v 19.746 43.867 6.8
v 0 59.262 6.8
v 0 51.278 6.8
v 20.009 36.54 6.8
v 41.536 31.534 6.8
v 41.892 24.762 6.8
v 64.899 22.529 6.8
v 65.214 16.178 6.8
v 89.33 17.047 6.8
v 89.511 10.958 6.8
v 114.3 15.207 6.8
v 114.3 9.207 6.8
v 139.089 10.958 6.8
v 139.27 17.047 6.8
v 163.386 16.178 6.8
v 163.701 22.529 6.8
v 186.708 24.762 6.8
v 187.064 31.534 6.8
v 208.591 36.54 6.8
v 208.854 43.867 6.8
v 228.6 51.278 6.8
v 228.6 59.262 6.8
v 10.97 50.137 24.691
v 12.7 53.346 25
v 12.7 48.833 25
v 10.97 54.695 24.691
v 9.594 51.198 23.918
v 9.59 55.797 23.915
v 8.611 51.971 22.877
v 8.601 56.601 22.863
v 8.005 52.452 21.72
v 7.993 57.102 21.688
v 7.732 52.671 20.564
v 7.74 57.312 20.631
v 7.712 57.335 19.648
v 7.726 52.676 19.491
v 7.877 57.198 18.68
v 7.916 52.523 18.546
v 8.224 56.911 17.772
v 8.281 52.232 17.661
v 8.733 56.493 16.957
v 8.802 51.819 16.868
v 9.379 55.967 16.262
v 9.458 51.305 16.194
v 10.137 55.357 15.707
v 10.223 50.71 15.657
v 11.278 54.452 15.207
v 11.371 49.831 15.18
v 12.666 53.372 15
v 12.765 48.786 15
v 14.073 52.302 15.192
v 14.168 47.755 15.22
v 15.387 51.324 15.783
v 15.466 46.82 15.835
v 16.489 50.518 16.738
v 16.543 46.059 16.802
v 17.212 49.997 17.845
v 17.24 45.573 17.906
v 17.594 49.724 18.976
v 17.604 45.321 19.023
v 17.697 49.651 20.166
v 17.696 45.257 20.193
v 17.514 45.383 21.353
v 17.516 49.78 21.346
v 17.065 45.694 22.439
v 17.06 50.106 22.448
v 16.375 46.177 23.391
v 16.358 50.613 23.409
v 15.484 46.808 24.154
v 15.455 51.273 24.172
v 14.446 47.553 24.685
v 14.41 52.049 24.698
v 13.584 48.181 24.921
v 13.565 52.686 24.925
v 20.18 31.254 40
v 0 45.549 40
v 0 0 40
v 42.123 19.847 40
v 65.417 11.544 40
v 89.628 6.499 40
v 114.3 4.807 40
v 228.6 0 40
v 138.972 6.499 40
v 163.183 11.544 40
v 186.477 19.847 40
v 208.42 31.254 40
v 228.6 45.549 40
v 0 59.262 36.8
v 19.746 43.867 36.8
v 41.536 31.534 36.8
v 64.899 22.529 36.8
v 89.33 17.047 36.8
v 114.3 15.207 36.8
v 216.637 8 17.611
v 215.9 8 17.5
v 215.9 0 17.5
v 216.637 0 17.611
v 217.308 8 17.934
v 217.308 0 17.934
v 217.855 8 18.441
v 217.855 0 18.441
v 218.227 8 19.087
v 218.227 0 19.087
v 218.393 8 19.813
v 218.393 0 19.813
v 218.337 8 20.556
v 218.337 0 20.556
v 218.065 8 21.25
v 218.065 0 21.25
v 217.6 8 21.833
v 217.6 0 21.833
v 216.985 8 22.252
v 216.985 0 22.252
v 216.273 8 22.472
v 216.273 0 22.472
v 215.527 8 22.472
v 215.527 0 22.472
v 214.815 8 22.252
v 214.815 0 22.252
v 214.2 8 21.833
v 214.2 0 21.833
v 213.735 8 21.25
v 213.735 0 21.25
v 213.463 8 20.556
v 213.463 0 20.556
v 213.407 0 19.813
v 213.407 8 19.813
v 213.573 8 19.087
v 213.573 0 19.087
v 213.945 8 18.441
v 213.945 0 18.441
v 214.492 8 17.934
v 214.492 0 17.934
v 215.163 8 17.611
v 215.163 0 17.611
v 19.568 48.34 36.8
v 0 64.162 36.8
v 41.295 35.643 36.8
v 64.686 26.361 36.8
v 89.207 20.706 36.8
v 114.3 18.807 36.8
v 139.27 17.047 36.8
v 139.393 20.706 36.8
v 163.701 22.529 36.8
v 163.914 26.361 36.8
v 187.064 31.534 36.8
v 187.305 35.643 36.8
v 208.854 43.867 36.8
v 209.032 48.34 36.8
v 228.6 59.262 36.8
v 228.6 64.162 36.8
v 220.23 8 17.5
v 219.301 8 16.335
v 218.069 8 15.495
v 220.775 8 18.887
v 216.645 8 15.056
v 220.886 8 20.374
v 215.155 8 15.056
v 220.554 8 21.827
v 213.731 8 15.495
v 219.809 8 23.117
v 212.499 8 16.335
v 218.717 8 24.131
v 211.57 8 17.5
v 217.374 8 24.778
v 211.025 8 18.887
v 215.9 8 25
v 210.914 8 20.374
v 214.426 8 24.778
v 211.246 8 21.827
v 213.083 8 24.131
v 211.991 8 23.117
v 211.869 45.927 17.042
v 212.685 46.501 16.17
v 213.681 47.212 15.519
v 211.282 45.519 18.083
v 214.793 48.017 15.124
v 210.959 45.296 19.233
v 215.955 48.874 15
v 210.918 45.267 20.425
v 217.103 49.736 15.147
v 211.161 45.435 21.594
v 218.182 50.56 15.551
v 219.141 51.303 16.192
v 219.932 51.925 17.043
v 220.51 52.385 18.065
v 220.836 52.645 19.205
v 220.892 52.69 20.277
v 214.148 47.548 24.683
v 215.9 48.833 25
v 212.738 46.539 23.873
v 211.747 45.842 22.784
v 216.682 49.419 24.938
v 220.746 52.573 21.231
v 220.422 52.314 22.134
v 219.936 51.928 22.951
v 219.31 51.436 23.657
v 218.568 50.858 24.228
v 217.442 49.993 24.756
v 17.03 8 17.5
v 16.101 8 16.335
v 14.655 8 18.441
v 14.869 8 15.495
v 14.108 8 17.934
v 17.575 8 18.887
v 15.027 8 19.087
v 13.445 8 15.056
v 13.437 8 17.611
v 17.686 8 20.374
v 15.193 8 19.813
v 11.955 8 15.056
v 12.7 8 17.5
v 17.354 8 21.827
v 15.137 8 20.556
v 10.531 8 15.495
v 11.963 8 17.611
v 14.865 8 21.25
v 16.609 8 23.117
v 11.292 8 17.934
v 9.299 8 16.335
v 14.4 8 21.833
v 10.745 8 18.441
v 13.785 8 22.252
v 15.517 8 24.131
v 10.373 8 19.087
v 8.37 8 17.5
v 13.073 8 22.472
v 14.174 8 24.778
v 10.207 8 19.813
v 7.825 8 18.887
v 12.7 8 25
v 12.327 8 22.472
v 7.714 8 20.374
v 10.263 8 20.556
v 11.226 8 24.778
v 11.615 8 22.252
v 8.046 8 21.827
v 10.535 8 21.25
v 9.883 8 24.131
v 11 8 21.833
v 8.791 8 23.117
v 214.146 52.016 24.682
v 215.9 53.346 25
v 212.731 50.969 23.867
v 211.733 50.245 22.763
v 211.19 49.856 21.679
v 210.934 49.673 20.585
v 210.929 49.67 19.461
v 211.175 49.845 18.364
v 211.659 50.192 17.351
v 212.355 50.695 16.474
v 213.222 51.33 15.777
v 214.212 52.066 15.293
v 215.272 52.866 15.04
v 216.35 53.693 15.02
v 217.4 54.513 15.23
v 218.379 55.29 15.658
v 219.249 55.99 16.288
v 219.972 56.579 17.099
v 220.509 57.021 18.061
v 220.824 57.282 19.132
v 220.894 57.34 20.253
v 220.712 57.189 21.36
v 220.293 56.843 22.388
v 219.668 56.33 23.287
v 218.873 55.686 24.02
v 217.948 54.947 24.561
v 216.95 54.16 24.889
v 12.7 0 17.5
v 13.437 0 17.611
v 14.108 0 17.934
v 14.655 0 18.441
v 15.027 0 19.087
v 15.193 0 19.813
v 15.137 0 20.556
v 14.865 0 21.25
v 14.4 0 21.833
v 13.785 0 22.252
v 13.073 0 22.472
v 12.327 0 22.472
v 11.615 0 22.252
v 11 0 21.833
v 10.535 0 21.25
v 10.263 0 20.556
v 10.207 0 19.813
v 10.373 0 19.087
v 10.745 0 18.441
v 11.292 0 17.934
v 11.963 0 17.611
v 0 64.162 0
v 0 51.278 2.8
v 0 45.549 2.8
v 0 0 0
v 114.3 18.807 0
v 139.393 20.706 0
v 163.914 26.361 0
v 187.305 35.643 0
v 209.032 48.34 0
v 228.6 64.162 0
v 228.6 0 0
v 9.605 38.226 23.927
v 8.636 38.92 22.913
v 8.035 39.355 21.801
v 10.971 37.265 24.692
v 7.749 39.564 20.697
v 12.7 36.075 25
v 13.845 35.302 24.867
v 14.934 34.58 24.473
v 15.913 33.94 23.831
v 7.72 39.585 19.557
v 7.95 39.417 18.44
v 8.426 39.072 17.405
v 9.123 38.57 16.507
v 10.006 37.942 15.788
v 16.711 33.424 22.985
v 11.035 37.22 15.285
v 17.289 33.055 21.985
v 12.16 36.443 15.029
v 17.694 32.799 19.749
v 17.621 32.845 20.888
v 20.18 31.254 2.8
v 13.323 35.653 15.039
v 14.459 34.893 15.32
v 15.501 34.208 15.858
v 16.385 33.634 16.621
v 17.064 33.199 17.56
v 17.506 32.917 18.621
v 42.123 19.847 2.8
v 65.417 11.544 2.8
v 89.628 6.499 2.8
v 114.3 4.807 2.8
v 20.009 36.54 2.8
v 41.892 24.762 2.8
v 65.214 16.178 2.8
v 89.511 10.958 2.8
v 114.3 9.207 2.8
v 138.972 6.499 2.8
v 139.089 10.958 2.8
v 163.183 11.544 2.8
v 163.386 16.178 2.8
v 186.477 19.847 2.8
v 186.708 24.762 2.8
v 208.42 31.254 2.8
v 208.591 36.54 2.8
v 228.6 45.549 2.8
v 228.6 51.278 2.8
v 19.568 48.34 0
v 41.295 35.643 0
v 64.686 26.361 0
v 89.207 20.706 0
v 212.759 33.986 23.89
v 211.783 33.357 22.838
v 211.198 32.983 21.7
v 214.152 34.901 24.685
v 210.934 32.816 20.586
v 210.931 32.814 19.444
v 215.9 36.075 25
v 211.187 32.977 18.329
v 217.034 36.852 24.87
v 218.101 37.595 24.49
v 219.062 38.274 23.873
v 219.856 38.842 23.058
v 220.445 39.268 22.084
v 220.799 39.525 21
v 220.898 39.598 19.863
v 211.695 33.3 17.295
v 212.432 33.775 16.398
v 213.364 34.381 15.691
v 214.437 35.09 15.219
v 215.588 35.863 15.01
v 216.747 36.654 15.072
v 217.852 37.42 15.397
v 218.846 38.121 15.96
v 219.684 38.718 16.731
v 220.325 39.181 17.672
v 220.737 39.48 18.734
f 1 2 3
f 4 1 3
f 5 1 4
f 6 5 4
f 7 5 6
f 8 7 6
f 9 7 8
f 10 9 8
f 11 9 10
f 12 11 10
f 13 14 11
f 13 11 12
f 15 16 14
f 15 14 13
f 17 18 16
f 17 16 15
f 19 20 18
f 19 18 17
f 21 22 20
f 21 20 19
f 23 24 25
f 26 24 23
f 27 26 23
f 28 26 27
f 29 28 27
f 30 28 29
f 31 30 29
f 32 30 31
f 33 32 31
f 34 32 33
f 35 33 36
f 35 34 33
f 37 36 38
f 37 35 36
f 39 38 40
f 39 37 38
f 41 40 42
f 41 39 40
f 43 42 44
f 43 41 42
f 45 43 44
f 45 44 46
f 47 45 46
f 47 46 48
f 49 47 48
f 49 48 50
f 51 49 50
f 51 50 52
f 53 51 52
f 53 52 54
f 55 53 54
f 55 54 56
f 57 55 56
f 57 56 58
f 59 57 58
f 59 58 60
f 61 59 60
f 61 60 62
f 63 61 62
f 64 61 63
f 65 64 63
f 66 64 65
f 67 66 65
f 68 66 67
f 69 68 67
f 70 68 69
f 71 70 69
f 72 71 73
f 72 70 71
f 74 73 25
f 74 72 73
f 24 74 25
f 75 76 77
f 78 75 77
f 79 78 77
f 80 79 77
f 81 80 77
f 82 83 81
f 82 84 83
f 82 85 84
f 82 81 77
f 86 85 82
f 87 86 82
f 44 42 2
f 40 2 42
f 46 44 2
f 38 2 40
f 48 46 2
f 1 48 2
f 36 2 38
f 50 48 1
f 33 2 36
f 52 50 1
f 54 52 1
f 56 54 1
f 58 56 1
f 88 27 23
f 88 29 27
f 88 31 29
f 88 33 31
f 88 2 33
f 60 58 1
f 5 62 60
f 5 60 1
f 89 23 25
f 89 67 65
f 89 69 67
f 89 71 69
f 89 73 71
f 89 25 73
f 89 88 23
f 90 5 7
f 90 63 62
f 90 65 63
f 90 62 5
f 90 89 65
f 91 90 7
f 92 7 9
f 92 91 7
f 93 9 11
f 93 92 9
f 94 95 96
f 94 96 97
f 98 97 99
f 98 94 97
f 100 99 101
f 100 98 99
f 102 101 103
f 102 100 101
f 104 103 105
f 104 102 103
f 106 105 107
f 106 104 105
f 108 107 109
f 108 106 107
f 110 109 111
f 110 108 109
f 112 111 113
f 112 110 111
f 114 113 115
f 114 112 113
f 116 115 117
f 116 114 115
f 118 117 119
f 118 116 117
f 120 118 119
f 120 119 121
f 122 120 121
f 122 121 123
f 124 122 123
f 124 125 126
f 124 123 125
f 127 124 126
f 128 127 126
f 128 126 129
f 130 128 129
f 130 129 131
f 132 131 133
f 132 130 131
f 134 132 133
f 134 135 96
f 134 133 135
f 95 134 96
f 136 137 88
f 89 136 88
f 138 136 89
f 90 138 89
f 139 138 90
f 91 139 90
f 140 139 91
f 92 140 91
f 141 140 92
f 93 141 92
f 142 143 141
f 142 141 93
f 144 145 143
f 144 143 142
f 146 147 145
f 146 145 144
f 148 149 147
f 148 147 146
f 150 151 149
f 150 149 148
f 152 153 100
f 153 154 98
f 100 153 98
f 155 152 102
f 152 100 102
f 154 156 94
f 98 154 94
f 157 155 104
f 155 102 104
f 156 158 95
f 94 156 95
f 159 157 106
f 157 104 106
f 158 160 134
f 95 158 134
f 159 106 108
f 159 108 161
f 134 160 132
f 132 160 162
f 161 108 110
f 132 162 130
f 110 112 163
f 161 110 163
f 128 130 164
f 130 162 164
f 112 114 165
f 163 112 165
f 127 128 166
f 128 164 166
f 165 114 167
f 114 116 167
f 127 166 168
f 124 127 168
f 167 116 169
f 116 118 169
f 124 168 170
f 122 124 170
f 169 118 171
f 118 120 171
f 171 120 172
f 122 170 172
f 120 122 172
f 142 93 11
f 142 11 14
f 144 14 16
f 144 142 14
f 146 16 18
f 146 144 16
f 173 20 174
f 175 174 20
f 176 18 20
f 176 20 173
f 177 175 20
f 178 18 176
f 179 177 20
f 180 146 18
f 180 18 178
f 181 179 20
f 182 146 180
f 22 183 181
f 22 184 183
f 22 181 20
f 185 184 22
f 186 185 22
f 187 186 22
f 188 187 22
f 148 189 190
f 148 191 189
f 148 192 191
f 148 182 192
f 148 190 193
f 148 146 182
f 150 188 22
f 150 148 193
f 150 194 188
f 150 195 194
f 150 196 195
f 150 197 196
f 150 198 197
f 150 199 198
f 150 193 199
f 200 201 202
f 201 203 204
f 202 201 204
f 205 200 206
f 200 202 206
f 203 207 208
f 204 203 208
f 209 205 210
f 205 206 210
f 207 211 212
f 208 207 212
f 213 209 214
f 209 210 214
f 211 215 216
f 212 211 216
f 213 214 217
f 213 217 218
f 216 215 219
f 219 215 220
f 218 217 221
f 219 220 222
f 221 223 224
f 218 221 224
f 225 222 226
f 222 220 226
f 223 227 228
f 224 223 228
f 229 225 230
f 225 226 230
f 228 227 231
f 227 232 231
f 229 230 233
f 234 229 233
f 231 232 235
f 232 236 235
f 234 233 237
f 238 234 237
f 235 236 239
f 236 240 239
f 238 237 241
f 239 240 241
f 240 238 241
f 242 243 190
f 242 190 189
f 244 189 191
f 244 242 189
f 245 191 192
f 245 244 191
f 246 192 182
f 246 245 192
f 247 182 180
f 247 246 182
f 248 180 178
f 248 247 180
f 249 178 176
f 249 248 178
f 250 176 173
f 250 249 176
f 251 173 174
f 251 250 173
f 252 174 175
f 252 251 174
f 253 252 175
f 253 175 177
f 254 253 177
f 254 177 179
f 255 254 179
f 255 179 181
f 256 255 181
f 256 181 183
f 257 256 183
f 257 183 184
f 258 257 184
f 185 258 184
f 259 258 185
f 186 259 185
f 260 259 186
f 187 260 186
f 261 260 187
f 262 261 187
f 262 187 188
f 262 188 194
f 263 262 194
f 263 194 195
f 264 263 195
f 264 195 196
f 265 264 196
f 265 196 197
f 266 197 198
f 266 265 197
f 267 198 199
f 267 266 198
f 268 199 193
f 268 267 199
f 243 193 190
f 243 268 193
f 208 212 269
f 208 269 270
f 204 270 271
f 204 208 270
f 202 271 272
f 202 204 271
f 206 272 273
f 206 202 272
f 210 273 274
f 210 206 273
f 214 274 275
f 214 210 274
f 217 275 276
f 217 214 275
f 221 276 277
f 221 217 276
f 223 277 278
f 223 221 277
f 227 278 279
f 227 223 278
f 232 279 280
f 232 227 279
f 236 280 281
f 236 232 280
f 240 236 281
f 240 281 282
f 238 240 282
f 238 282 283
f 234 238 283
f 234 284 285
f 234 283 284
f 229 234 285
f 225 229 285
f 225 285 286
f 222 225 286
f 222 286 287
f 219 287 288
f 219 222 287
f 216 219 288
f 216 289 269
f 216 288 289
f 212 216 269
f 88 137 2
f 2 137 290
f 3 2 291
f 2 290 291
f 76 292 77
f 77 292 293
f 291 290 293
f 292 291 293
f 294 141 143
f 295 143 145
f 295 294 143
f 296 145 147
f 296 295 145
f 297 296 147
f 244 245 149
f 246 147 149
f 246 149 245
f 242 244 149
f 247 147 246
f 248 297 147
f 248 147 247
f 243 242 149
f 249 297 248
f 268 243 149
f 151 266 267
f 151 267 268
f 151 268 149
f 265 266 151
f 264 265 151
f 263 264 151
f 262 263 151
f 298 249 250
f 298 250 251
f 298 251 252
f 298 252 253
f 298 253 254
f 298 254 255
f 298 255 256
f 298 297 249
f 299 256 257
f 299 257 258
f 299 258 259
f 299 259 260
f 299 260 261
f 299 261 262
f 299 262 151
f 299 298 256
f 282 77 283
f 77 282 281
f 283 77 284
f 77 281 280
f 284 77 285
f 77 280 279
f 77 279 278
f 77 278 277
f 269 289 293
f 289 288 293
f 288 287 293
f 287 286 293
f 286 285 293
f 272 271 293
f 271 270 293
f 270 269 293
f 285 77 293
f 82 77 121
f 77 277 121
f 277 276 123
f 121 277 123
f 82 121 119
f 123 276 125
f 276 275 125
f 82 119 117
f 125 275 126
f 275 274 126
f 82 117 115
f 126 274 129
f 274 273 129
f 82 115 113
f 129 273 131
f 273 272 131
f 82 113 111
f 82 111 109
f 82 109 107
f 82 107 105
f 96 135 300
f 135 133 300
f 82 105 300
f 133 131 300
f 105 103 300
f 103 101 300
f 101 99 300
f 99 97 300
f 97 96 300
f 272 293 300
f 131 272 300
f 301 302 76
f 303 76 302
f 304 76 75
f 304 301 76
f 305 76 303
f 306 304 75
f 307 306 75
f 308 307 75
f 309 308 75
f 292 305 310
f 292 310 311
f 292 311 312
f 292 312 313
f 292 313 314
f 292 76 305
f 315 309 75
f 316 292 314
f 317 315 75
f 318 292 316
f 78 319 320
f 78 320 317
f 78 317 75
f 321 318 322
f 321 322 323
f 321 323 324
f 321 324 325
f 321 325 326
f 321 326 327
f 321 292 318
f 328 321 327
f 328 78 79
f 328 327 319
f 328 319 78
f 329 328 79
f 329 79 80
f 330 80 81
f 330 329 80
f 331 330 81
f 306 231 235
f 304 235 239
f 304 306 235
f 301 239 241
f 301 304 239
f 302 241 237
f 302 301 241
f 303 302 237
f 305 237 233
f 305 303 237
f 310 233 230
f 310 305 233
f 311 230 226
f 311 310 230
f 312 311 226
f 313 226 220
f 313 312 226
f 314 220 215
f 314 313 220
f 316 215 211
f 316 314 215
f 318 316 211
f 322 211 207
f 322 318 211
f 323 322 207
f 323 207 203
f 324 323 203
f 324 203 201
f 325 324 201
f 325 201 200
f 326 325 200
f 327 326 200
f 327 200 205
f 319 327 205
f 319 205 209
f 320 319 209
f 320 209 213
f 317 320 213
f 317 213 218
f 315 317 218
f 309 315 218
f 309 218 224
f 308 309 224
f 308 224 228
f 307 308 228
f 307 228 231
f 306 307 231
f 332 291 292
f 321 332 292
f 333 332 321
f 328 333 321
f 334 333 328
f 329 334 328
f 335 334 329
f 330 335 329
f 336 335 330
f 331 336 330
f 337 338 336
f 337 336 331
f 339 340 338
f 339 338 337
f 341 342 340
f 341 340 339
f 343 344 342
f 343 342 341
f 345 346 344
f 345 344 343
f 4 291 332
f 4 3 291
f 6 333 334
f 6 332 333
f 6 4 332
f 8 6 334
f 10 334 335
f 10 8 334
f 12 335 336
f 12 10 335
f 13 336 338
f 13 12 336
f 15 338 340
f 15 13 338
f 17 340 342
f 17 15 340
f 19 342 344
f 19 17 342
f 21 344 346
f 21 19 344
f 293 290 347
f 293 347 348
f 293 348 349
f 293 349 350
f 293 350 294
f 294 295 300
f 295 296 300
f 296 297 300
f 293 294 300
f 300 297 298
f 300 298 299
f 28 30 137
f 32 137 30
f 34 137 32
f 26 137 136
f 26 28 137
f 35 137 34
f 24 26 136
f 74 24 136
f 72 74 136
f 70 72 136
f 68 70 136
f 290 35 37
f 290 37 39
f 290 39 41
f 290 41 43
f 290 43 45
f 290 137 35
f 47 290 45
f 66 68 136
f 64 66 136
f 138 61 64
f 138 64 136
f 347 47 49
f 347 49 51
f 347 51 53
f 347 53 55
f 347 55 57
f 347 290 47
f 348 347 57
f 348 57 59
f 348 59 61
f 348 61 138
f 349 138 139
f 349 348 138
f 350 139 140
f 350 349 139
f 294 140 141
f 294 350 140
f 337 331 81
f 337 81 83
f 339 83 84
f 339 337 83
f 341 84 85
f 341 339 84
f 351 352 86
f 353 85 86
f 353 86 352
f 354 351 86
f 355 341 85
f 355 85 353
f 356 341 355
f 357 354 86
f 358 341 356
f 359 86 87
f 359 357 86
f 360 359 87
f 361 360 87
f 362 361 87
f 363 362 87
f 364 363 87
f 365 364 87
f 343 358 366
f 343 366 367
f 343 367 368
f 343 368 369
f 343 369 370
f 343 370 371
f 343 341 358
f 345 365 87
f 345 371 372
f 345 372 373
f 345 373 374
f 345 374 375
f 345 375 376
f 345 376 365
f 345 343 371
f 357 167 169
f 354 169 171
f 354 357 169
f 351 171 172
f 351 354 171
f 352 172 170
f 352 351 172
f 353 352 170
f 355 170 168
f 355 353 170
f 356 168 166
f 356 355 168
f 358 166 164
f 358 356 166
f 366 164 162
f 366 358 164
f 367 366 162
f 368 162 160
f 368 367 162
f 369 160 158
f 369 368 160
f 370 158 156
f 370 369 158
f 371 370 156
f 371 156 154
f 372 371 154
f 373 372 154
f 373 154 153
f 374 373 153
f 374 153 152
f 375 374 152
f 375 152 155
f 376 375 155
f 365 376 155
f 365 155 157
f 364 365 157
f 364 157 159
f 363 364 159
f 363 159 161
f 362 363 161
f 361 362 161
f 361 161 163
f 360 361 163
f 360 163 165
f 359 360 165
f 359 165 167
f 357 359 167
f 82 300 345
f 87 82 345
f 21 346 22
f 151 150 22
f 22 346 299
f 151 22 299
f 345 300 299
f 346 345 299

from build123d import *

# Parameters (mm, degrees)
BOSS_EXTRUDE1_DEPTH     = 40
SKETCH2_W               = 26
SKETCH2_H               = 6
CUT_EXTRUDE1_DEPTH      = 243.400412541
CUT_EXTRUDE1_DEPTH_BACK = 243.400412541
SKETCH4_R               = 2.5
CUT_EXTRUDE3_START      = 7.142108
SKETCH7_R               = 5
CUT_EXTRUDE3_DEPTH      = 54.857892


with BuildPart() as part:
    # Sketch1 → Boss-Extrude1 (new body)
    with BuildSketch(Plane.XY):
        with BuildLine():
            Line((0, 0), (228.6, 0))
            Line((228.6, 0), (228.6, 70))
            ThreePointArc((228.6, 70), (114.3, 23.006536612), (0, 70))
            Line((0, 70), (0, 0))
        make_face()
    extrude(amount=BOSS_EXTRUDE1_DEPTH)

    # Sketch2 → Cut-Revolve1 (revolve, cut)
    with BuildSketch(Plane(origin=(114.3, 0, 0), x_dir=(0, 0, -1), z_dir=(1, 0, 0))):
        with Locations((-20, 12.006536612)):
            Rectangle(SKETCH2_W, SKETCH2_H)
    revolve(axis=Axis((114.3, 185.506536612, 40), (0, 0, 1)), mode=Mode.SUBTRACT)

    # Sketch4 → Cut-Extrude1 (cut, two sides: drawn at the far end of the back side and taken through both)
    with BuildSketch(Plane.XZ.offset(-CUT_EXTRUDE1_DEPTH_BACK)):
        with Locations(Location((12.7, 20, 0), (0, 0, 270))):
            Circle(SKETCH4_R)
        with Locations(Location((215.9, 20, 0), (0, 0, 270))):
            Circle(SKETCH4_R)
    extrude(amount=CUT_EXTRUDE1_DEPTH + CUT_EXTRUDE1_DEPTH_BACK, mode=Mode.SUBTRACT)

    # Sketch7 → Cut-Extrude3 (cut)
    with BuildSketch(Plane(origin=(0, 70, 0), x_dir=(-1, 0, 0), z_dir=(0, -1, 0)).offset(CUT_EXTRUDE3_START)):
        with Locations(Location((-215.9, -20, 0), (0, 0, 270))):
            Circle(SKETCH7_R)
        with Locations(Location((-12.7, -20, 0), (0, 0, 270))):
            Circle(SKETCH7_R)
    extrude(amount=CUT_EXTRUDE3_DEPTH, mode=Mode.SUBTRACT)

    # Sketch9 → Cut-Revolve3 (revolve, cut)
    with BuildSketch(Plane(origin=(114.3, 0, 0), x_dir=(0, 0, -1), z_dir=(1, 0, 0))):
        Polygon((0, 18.806536612), (0, 23.006536612), (-40, 23.006536612), (-40, 4.806536612), (-2.8, 4.806536612), (-2.8, 9.206536612), (-6.8, 9.206536612), (-6.8, 15.206536612), (-36.8, 15.206536612), (-36.8, 18.806536612), align=None)
    revolve(axis=Axis((114.3, 185.506536612, 40), (0, 0, 1)), mode=Mode.SUBTRACT)


solid = part.part
